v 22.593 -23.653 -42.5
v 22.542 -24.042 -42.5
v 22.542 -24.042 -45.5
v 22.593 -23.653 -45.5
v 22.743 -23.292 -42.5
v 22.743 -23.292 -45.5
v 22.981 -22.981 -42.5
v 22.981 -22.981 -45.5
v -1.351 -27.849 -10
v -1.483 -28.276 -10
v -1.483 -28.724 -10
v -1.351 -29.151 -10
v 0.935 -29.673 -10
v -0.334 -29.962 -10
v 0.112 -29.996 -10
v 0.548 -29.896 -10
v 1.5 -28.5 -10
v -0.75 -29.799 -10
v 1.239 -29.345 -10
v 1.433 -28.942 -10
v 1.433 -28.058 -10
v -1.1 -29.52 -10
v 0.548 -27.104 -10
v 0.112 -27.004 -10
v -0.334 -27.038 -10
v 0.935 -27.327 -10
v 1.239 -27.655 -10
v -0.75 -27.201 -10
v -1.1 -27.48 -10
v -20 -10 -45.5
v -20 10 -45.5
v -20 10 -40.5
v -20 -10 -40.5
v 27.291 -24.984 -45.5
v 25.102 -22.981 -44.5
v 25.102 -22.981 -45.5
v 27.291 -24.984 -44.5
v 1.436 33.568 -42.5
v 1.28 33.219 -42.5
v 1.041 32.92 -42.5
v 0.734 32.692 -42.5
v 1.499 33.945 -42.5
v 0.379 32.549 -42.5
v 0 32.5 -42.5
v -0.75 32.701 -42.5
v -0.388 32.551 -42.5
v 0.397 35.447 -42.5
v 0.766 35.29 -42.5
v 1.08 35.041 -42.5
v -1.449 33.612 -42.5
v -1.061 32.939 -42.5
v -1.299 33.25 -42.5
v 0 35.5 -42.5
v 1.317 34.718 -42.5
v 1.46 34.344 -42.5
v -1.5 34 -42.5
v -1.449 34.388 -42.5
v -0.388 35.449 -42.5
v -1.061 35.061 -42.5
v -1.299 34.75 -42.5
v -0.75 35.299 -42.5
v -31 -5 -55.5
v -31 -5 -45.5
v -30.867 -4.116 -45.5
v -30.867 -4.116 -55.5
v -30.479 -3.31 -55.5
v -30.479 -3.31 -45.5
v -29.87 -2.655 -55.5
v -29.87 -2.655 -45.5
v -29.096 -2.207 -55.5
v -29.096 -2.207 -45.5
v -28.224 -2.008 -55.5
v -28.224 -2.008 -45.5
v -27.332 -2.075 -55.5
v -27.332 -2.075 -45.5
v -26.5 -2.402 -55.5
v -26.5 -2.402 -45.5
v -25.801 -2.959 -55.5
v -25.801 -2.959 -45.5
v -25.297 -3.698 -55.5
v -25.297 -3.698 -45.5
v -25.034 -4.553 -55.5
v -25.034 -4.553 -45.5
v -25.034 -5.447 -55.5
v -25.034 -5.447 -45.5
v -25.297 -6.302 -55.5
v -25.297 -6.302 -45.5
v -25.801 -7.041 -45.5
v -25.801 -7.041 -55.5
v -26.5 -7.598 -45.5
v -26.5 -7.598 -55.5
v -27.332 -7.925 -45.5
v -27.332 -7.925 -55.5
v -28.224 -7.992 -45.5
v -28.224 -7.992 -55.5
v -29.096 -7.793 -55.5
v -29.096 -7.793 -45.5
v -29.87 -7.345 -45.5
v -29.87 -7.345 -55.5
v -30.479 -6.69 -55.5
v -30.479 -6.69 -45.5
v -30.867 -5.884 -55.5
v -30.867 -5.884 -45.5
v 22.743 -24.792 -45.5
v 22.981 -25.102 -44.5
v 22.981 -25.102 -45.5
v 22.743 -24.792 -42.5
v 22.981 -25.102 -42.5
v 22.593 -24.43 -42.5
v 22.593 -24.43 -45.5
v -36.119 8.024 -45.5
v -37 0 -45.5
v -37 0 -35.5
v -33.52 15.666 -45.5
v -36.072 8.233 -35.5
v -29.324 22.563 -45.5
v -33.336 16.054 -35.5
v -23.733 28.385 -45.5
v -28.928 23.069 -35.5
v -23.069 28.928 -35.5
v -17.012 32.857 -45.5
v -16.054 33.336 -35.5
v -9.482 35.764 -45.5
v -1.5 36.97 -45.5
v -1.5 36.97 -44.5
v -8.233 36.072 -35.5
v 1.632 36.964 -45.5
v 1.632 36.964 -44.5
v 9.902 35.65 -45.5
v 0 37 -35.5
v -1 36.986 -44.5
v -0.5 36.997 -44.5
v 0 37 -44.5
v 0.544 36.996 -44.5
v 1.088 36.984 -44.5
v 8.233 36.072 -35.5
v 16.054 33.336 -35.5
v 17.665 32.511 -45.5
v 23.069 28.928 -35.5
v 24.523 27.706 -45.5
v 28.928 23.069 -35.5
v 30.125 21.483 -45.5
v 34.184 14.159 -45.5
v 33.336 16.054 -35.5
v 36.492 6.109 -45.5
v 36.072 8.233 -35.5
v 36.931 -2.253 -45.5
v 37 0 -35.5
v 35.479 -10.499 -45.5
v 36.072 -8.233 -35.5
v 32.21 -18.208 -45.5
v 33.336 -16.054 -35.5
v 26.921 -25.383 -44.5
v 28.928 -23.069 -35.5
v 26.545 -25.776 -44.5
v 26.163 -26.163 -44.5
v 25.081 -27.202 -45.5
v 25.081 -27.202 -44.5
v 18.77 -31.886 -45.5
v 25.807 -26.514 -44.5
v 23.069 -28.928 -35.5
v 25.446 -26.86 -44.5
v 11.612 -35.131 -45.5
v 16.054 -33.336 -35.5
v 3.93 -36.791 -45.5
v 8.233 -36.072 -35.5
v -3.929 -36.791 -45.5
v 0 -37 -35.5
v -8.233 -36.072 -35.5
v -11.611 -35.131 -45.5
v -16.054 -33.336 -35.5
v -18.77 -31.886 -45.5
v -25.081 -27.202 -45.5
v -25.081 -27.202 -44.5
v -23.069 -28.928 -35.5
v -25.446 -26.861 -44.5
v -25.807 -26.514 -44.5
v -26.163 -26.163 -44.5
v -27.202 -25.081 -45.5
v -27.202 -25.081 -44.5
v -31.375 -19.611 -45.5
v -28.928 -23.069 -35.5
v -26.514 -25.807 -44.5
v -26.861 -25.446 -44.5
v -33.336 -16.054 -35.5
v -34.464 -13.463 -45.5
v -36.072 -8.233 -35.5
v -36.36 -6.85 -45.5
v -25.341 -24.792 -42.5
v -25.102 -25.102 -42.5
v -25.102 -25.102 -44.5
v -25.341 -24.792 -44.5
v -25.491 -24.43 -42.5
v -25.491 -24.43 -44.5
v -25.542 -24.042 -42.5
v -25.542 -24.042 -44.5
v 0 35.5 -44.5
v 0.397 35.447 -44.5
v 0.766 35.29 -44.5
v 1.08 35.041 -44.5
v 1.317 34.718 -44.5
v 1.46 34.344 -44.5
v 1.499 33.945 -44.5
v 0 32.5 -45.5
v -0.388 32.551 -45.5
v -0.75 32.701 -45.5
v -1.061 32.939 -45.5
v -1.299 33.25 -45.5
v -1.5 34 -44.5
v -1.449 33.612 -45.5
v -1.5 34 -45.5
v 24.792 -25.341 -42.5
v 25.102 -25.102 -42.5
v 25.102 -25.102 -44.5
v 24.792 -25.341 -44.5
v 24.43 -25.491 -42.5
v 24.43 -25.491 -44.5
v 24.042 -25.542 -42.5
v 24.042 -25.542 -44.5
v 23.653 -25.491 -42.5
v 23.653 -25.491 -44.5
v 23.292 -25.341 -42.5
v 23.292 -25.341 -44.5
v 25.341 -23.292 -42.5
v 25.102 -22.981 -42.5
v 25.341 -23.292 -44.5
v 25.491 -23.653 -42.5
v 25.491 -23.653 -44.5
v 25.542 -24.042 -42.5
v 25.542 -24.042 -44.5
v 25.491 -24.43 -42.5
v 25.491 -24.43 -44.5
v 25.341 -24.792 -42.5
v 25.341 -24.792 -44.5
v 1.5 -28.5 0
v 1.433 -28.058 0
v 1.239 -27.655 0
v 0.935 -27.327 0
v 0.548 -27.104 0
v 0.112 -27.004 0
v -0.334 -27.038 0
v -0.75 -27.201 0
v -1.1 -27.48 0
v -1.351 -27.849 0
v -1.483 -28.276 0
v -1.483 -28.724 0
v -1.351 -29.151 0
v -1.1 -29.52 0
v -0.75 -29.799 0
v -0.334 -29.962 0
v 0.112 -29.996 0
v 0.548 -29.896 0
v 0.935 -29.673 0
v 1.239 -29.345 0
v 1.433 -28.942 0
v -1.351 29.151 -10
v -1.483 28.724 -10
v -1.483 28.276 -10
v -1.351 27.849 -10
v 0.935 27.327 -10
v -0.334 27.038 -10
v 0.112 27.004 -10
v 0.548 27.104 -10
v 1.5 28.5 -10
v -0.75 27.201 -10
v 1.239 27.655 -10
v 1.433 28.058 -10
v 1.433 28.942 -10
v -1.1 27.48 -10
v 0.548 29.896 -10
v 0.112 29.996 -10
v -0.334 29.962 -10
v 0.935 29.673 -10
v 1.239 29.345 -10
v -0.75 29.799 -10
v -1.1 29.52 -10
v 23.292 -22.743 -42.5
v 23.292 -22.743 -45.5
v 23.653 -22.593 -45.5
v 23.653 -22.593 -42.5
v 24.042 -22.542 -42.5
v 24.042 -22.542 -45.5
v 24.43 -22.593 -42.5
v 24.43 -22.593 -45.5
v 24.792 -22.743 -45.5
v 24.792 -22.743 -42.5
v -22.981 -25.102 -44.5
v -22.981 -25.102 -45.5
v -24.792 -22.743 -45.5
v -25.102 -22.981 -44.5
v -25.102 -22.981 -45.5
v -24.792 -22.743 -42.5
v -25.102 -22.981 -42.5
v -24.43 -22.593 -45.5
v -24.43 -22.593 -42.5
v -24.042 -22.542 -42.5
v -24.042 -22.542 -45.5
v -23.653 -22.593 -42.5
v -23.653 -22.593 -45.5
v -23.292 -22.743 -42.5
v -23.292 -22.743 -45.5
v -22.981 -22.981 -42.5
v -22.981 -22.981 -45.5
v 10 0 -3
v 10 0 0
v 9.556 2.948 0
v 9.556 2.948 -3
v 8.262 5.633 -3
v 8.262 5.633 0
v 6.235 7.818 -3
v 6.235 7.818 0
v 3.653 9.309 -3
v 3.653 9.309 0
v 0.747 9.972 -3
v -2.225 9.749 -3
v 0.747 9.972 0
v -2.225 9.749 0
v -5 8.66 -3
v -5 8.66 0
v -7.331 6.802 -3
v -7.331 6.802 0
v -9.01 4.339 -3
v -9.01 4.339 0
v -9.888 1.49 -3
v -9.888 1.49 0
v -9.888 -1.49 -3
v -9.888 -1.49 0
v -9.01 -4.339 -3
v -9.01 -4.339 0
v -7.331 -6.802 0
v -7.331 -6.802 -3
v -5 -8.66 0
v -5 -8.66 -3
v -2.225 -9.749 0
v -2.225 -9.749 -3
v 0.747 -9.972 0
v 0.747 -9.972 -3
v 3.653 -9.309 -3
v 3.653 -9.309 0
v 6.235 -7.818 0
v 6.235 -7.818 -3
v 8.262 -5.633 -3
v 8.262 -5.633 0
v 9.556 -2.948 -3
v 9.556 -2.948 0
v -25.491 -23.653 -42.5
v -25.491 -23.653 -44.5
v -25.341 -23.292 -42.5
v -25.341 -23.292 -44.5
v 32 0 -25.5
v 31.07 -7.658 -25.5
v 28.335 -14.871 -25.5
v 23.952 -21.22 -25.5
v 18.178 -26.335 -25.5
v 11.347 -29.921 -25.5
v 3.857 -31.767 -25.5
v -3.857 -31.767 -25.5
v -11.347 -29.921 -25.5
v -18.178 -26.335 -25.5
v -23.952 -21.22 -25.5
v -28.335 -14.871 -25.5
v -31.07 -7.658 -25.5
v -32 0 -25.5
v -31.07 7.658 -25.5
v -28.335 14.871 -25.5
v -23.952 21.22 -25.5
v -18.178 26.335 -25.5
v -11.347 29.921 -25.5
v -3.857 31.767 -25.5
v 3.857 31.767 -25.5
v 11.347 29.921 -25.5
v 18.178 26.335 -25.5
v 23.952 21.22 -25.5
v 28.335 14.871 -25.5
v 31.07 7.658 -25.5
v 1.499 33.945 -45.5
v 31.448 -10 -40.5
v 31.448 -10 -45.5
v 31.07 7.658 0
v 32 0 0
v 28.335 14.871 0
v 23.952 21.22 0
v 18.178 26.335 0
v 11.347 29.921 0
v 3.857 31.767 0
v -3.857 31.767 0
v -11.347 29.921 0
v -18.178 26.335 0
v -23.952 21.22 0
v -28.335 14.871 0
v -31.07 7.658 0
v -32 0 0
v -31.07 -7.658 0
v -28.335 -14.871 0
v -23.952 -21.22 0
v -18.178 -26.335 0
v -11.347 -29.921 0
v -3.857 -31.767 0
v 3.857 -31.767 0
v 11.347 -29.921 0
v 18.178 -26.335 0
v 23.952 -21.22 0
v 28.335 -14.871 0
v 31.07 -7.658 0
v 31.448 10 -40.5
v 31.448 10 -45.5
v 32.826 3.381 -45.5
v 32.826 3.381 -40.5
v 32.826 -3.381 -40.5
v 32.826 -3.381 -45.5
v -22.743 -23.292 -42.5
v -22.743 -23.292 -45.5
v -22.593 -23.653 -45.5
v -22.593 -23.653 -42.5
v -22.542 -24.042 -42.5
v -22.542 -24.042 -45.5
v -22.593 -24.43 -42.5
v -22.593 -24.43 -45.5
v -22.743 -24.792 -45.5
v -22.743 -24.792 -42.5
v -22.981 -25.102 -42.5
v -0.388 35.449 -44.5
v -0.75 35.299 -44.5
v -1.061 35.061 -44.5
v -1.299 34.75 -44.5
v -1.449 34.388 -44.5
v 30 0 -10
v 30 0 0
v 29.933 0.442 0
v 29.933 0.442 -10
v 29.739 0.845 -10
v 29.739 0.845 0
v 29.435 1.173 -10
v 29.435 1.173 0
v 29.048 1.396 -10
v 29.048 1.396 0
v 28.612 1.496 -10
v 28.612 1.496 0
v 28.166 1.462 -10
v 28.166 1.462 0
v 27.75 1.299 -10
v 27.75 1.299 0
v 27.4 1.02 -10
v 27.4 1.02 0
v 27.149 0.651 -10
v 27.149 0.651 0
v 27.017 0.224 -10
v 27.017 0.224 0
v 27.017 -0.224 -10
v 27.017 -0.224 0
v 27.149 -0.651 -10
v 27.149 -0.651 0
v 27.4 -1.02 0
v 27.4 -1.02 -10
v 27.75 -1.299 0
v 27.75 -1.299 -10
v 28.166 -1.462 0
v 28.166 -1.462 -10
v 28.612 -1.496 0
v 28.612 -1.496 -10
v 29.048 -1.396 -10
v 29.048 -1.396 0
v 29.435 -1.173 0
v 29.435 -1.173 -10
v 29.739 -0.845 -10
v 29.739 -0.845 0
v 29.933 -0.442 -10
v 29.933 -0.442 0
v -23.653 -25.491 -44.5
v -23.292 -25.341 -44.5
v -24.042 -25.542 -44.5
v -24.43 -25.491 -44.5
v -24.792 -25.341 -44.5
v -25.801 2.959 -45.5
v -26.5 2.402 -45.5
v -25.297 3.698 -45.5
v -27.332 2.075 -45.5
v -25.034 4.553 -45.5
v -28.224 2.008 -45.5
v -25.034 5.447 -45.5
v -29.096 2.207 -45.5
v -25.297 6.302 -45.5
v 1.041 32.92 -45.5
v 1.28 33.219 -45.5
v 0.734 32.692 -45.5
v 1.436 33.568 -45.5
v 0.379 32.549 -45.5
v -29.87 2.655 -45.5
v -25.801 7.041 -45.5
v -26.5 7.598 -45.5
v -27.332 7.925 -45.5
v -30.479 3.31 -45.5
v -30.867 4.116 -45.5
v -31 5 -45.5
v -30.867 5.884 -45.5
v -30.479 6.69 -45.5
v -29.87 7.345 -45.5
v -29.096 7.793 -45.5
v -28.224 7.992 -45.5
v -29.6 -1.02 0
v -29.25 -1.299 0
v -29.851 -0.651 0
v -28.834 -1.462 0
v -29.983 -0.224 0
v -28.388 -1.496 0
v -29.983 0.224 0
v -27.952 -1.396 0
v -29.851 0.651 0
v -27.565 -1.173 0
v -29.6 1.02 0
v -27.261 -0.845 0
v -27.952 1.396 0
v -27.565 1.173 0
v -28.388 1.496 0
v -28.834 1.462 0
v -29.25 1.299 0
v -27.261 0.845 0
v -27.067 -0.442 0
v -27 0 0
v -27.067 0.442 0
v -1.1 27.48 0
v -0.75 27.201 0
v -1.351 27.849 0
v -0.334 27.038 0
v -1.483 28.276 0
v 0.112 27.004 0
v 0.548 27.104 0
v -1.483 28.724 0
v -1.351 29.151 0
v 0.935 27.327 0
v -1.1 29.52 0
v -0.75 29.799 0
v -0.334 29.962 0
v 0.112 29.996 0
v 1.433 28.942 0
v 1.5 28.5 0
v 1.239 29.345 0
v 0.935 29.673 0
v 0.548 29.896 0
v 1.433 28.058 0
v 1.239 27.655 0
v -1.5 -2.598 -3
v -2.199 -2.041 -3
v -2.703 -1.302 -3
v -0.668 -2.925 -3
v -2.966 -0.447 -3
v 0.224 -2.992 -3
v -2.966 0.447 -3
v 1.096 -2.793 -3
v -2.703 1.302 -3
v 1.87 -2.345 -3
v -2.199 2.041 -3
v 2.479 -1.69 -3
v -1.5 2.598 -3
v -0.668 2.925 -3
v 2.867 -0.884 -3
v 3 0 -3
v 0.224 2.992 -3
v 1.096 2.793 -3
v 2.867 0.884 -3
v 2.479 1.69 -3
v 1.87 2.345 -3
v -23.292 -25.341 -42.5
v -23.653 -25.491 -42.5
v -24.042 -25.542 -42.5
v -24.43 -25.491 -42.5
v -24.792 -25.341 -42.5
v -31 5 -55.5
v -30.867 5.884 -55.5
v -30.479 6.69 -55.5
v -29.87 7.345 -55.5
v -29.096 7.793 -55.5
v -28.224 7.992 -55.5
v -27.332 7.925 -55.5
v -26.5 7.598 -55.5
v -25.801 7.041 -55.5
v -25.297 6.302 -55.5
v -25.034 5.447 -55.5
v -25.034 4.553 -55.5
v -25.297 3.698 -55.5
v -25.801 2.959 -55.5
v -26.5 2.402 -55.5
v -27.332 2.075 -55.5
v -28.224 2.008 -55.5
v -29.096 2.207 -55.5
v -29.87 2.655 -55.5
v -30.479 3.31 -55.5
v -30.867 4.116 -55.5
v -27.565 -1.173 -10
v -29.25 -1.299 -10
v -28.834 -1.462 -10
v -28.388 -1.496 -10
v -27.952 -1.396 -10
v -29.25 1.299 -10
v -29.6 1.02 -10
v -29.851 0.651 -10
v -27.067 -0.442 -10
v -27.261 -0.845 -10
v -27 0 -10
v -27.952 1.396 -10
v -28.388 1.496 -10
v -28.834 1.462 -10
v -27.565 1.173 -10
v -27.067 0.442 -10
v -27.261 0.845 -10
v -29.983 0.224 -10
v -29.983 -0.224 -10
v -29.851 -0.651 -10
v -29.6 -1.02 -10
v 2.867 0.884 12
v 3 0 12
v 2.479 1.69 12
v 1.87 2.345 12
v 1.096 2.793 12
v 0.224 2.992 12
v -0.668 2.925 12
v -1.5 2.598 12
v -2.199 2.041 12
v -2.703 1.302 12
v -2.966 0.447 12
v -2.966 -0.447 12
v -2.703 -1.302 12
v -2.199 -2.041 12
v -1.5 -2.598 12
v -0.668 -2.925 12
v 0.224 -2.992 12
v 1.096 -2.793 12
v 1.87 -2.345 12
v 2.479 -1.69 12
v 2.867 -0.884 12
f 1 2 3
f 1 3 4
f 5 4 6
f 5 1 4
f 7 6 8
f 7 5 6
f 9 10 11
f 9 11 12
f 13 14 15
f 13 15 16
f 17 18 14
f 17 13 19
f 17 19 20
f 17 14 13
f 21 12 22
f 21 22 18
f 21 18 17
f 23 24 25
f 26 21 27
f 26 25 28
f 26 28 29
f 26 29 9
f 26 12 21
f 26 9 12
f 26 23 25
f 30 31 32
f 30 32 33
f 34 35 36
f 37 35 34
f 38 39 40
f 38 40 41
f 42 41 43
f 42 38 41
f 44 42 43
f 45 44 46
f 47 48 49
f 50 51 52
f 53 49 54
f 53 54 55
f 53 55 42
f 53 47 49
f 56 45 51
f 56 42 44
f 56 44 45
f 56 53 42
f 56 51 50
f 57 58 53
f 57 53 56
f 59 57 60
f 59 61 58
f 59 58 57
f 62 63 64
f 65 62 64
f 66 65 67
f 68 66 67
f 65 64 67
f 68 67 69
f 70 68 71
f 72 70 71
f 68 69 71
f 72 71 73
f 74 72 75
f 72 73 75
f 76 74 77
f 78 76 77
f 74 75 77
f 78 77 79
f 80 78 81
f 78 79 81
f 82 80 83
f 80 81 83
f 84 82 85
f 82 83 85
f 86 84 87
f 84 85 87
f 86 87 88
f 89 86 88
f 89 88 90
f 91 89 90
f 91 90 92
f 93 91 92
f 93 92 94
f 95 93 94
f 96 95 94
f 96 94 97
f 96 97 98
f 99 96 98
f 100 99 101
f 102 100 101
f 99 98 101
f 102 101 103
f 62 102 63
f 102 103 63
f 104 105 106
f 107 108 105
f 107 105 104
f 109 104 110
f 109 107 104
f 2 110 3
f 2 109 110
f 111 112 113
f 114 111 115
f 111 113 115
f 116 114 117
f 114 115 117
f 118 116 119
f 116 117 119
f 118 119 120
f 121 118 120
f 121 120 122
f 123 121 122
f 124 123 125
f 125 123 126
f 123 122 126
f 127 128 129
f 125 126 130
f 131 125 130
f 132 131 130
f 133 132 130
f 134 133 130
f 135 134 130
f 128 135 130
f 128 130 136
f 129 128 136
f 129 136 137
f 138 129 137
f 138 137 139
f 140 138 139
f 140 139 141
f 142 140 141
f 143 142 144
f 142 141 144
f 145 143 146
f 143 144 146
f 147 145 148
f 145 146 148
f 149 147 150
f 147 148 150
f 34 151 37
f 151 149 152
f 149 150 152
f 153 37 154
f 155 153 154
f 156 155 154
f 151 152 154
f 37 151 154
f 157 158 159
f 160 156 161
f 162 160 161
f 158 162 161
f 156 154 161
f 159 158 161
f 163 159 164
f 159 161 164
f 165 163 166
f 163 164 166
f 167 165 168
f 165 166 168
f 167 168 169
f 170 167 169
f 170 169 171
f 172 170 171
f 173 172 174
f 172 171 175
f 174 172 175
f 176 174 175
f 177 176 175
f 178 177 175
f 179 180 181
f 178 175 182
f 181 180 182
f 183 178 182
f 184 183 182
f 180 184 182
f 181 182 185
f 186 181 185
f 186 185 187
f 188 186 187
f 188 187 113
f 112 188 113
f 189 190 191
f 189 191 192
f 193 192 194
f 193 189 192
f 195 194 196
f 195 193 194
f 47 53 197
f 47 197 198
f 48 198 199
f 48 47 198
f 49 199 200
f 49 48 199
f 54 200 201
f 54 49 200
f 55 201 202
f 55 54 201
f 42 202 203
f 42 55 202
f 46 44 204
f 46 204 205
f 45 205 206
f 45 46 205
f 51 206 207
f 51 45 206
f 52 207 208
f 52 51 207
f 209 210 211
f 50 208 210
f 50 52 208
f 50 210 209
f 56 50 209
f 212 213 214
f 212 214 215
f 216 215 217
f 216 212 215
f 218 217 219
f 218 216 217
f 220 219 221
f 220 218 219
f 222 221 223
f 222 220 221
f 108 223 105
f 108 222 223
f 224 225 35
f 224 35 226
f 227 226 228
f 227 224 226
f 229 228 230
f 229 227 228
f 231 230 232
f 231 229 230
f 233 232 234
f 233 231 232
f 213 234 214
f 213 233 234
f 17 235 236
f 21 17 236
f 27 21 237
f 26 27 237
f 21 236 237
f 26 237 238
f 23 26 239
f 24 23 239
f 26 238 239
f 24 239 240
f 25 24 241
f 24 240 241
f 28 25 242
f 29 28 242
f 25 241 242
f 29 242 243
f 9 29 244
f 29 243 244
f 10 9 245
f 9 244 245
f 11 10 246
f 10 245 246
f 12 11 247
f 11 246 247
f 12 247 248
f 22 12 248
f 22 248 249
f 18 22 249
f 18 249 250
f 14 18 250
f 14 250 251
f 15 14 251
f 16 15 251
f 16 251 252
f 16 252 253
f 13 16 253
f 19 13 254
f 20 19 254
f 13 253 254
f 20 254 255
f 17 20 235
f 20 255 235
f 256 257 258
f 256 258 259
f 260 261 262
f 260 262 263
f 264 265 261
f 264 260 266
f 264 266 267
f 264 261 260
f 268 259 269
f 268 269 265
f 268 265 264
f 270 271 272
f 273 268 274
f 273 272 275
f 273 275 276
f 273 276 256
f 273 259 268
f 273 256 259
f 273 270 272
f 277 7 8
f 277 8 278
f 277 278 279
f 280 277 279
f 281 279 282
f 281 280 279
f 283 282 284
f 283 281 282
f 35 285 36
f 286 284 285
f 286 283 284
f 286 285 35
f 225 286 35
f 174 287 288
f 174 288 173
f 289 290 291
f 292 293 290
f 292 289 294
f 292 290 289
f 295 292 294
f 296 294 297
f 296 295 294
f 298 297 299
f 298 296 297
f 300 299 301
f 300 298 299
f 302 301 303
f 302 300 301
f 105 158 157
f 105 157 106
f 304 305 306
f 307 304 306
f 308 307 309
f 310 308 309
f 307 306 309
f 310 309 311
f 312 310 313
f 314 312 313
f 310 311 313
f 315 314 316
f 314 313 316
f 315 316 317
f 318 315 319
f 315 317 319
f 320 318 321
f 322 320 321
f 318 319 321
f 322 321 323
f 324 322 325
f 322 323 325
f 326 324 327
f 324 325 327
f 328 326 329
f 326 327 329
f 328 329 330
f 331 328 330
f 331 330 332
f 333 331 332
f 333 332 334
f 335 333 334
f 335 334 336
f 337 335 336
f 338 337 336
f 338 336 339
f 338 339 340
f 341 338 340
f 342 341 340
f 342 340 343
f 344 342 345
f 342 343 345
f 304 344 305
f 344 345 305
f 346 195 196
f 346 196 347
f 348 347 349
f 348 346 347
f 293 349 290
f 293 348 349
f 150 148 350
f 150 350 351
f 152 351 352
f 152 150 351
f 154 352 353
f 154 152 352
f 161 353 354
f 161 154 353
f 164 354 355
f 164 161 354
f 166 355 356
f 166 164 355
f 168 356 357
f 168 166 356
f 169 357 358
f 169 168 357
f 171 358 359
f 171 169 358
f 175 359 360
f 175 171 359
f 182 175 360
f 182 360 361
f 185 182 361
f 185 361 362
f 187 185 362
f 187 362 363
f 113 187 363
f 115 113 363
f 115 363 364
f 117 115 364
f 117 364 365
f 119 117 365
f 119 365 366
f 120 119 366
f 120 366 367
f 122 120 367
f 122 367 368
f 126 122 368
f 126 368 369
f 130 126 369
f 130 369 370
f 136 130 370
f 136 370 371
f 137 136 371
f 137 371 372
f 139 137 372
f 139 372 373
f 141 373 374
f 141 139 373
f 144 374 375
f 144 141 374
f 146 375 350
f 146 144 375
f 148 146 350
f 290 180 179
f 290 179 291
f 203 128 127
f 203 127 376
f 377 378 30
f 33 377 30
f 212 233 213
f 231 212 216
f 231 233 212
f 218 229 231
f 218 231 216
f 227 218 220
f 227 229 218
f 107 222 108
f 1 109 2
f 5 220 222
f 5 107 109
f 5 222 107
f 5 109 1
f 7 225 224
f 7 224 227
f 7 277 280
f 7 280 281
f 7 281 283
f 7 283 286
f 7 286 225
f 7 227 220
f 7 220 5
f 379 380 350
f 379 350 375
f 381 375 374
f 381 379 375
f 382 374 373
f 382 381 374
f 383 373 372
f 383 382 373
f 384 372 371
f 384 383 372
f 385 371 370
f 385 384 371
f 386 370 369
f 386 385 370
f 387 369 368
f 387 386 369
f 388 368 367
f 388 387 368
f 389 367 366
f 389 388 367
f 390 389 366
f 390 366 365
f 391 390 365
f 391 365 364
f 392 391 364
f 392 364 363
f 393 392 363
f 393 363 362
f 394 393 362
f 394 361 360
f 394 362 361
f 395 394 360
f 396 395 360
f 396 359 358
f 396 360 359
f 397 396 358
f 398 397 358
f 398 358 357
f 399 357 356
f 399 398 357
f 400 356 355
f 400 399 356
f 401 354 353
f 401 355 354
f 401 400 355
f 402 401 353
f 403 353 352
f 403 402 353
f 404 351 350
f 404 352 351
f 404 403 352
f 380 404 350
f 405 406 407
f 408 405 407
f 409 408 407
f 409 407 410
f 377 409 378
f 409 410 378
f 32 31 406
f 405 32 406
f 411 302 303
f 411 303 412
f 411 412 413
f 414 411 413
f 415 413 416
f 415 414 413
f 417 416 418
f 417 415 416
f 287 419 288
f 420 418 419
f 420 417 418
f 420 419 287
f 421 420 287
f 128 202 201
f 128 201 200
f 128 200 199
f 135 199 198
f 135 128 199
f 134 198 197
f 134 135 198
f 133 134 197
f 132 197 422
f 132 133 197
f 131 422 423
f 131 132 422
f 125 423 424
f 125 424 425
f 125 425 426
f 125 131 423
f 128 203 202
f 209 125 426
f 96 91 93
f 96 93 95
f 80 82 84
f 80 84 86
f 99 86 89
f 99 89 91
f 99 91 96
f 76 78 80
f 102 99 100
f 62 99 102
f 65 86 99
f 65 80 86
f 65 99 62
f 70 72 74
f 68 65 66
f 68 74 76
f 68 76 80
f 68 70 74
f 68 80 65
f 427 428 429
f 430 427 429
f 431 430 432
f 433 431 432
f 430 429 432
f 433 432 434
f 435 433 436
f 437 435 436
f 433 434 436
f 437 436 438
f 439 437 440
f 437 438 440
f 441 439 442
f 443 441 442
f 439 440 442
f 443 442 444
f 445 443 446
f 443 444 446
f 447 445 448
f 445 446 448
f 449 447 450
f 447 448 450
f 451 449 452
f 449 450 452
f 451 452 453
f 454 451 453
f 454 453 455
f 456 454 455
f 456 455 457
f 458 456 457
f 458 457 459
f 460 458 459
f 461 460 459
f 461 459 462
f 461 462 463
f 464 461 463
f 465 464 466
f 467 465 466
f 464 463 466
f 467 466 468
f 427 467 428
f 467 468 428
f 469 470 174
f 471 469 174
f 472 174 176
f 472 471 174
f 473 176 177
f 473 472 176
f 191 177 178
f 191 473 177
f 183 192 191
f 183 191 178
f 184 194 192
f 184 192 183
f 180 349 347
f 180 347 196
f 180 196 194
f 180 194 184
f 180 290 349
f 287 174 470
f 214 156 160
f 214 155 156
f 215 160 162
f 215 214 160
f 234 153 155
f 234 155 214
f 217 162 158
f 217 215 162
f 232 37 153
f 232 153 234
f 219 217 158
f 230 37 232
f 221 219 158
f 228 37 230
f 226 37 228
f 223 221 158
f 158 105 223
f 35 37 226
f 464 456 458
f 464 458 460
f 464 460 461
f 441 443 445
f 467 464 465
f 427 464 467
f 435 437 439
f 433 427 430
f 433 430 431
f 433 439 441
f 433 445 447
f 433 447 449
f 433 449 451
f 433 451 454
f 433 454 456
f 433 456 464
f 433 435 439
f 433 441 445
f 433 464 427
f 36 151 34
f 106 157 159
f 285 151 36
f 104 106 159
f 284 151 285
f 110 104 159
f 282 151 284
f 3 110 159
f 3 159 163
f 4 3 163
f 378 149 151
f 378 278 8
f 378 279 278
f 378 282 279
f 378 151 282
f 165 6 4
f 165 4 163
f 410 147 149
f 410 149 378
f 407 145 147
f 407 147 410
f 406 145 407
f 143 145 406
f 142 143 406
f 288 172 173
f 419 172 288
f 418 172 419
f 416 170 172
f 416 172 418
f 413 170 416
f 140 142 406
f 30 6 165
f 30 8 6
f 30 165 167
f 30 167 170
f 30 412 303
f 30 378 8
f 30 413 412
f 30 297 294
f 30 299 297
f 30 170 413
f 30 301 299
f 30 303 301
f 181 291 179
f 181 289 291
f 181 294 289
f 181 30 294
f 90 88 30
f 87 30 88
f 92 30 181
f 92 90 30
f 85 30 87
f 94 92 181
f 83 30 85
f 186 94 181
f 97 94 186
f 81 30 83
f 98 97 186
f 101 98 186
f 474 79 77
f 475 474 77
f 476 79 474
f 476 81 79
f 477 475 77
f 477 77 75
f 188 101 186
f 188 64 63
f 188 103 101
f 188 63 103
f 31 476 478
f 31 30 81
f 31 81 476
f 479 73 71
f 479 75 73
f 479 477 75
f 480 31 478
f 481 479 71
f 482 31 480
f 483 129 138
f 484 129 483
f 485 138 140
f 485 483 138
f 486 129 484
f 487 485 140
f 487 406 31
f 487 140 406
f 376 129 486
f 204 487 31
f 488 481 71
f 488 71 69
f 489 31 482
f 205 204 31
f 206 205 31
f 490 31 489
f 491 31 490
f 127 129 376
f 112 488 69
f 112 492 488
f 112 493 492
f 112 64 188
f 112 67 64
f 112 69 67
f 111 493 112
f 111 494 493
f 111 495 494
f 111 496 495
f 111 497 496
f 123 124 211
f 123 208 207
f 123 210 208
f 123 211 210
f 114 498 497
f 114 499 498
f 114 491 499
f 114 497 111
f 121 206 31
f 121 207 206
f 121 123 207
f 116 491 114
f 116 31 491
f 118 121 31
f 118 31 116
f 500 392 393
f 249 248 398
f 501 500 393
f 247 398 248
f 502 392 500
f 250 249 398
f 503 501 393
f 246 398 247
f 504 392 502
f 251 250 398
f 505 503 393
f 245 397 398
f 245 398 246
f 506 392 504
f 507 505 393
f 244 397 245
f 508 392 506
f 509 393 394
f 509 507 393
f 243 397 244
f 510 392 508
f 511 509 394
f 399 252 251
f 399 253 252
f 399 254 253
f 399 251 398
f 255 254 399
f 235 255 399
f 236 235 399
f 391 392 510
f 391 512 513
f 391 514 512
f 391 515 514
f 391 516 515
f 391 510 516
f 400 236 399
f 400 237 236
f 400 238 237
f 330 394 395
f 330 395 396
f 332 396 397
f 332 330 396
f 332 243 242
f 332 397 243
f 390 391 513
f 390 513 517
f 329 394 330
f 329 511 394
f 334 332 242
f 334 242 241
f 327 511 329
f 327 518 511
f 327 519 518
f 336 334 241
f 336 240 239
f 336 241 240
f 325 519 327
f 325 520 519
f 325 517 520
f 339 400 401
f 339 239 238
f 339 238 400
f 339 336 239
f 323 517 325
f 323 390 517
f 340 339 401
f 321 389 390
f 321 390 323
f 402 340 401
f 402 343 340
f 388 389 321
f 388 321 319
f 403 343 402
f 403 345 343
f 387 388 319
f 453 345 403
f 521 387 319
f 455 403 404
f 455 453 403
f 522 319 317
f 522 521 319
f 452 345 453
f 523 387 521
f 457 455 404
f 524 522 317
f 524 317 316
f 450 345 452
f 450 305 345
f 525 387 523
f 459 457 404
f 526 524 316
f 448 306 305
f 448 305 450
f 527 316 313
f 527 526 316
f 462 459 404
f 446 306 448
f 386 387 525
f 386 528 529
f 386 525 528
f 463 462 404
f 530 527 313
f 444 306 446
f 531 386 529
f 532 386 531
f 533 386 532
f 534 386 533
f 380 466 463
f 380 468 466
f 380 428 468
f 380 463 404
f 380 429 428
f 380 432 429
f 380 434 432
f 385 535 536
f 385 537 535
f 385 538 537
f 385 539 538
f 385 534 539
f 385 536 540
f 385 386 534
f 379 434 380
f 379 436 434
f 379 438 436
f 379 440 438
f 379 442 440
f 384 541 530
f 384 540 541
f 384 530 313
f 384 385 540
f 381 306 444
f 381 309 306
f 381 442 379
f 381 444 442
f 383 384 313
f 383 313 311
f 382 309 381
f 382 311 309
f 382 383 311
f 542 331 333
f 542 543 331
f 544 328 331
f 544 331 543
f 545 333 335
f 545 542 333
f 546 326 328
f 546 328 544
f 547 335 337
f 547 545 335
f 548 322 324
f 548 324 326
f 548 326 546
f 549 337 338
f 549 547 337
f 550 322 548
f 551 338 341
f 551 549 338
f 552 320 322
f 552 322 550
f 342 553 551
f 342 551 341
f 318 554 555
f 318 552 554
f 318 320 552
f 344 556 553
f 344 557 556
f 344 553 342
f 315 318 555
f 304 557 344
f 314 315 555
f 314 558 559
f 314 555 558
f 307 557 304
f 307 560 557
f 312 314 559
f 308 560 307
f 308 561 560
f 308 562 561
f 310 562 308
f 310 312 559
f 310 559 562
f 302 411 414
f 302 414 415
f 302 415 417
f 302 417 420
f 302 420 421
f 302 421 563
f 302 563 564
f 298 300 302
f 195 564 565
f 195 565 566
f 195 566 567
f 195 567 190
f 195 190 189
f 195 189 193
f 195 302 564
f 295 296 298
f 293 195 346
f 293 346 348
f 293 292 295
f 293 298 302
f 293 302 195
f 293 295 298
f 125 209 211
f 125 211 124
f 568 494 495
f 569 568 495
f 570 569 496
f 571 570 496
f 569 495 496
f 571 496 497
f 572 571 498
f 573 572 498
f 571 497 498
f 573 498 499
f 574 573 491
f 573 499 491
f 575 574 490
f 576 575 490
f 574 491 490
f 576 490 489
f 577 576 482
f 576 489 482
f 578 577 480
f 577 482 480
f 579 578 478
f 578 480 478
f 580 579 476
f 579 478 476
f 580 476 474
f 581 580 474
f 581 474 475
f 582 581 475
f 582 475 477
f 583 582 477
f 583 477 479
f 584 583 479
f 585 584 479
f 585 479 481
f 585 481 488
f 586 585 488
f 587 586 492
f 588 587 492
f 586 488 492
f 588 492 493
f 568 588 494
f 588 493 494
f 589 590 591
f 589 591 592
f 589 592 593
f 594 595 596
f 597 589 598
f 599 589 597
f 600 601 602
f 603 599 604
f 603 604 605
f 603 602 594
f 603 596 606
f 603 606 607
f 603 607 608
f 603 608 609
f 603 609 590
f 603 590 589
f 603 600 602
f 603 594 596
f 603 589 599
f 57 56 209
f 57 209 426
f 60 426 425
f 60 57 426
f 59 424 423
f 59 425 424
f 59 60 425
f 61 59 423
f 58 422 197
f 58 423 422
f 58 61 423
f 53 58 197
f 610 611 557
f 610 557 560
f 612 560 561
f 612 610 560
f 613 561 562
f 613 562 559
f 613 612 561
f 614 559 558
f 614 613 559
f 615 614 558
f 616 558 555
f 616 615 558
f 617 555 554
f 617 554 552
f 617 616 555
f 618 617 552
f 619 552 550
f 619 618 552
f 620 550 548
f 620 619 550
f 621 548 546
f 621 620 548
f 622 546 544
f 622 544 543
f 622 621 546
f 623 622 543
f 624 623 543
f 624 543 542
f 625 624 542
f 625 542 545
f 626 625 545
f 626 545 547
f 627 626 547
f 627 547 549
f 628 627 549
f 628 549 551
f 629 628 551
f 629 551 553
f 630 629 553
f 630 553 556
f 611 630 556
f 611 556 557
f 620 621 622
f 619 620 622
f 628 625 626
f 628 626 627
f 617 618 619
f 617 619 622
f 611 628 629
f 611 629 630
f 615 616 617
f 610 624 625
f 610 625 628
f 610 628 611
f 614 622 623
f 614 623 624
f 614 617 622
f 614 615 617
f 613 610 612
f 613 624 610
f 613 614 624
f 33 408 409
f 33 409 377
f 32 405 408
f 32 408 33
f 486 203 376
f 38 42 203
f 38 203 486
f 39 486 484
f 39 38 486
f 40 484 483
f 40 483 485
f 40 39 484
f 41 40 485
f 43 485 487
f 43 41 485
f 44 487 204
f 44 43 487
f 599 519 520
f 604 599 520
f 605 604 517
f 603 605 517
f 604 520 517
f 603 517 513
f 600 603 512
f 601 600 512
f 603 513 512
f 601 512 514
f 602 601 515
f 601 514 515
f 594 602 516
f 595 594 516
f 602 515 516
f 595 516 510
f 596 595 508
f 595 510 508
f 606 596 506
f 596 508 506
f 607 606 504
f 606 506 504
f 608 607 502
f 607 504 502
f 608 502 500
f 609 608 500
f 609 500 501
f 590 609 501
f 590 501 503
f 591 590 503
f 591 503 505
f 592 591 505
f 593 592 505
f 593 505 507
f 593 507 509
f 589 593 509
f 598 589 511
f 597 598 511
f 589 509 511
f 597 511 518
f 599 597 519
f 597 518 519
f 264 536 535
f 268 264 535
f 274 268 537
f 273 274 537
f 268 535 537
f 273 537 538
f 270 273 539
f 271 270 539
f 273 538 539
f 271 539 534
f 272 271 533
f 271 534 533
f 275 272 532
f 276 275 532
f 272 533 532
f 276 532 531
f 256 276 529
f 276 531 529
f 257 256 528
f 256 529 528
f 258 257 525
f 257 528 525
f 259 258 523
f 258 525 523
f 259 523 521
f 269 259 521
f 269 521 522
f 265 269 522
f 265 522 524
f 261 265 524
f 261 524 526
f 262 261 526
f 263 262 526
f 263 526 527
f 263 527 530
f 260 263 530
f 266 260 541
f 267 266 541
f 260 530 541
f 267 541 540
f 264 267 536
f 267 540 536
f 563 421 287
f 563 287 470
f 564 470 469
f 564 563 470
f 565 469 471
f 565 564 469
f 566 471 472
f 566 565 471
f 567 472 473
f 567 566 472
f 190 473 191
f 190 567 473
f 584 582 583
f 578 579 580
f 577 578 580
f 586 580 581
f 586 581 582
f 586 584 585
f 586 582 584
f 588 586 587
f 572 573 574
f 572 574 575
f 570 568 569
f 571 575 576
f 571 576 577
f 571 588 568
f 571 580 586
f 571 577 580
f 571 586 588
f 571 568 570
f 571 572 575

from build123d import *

# Parameters (mm, degrees)
SKETCH_1_R          = 32
EXTRUDE_1_DEPTH     = 25.5
SKETCH_3_R          = 37
EXTRUDE_3_DEPTH     = 10
SKETCH_4_R          = 1.5
CUT_EXTRUDE_1_DEPTH = 10
CUT_EXTRUDE_2_DEPTH = 5
SKETCH_7_R          = 3
EXTRUDE_4_DEPTH     = 10
CUT_EXTRUDE_START   = -1
CUT_EXTRUDE_3_DEPTH = 1
CUT_EXTRUDE_START_2 = -3
SKETCH_8_3_R        = 1.5
CUT_EXTRUDE_4_DEPTH = 3
SKETCH_9_R          = 10
SKETCH_9_R_2        = 3
CUT_EXTRUDE_5_DEPTH = 3
EXTRUDE_START       = 12
SKETCH_9_4_R        = 3
EXTRUDE_5_DEPTH     = 12


with BuildPart() as part:
    # 草图1 → 凸台-拉伸1 (new body)
    with BuildSketch(Plane.XY):
        Circle(SKETCH_1_R)
    extrude(amount=-EXTRUDE_1_DEPTH)



with BuildPart() as body_2:
    # 草图3 → 凸台-拉伸3 (new body)
    with BuildSketch(Plane(origin=(0, 0, -35.5), x_dir=(-1, 0, 0), z_dir=(0, 0, -1))):
        Circle(SKETCH_3_R)
    extrude(amount=EXTRUDE_3_DEPTH)


with BuildPart() as part_1:
    add(part.part)

    add(body_2.part)  # loft_1 joins it to this body
    # loft up to a face of the part (loft_1)
    loft([Face(Wire([part_1.edges().sort_by_distance((-21.90550739, -23.326996077, -25.5))[0]])), Face(Wire([part_1.edges().sort_by_distance((25.328242919, -26.971839215, -35.5))[0]]))])

    # 草图4 → 切除-拉伸1 (cut)
    with BuildSketch(Plane.XY):
        with Locations((28.5, 0)):
            Circle(SKETCH_4_R)
        with Locations((-28.5, 0)):
            Circle(SKETCH_4_R)
        with Locations((0, 28.5)):
            Circle(SKETCH_4_R)
        with Locations((0, -28.5)):
            Circle(SKETCH_4_R)
    extrude(amount=-CUT_EXTRUDE_1_DEPTH, mode=Mode.SUBTRACT)

    # 草图5 → 切除-拉伸2 (cut)
    with BuildSketch(Plane(origin=(0, 0, -45.5), x_dir=(-1, 0, 0), z_dir=(0, 0, -1))):
        with BuildLine():
            Line((-31.448370387, -10), (20, -10))
            Line((20, -10), (20, 10))
            Line((20, 10), (-31.448370387, 10))
            ThreePointArc((-31.448370387, 10), (-33, 0), (-31.448370387, -10))
        make_face()
    extrude(amount=-CUT_EXTRUDE_2_DEPTH, mode=Mode.SUBTRACT)

    # 草图7 → 凸台-拉伸4 (add)
    with BuildSketch(Plane(origin=(0, 0, -45.5), x_dir=(-1, 0, 0), z_dir=(0, 0, -1))):
        with Locations((28, 5)):
            Circle(SKETCH_7_R)
        with Locations((28, -5)):
            Circle(SKETCH_7_R)
    extrude(amount=EXTRUDE_4_DEPTH)

    # 草图8 → 切除-拉伸3 (cut)
    with BuildSketch(Plane(origin=(0, 0, -45.5), x_dir=(-1, 0, 0), z_dir=(0, 0, -1)).offset(CUT_EXTRUDE_START)):
        with BuildLine():
            Line((-1.632304903, 36.963976798), (-1.499003176, 33.945323885))
            ThreePointArc((-1.499003176, 33.945323885), (-0.0273426, 35.499750773), (1.5, 34))
            Line((1.5, 34), (1.5, 36.969582091))
            ThreePointArc((1.5, 36.969582091), (-0.066211794, 36.999940757), (-1.632304903, 36.963976798))
        make_face()
        with BuildLine():
            Line((-25.08100879, -27.201893281), (-22.980970389, -25.102290732))
            ThreePointArc((-22.980970389, -25.102290732), (-25.102290732, -25.102290732), (-25.102290732, -22.980970389))
            Line((-25.102290732, -22.980970389), (-27.290652839, -24.984400486))
            ThreePointArc((-27.290652839, -24.984400486), (-26.209293276, -26.1165263), (-25.08100879, -27.201893281))
        make_face()
        with BuildLine():
            Line((22.980970389, -25.102290732), (25.080782023, -27.202102366))
            ThreePointArc((25.080782023, -27.202102366), (26.162950904, -26.162950904), (27.202102366, -25.080782023))
            Line((27.202102366, -25.080782023), (25.102290732, -22.980970389))
            ThreePointArc((25.102290732, -22.980970389), (25.102290732, -25.102290732), (22.980970389, -25.102290732))
        make_face()
    extrude(amount=CUT_EXTRUDE_3_DEPTH, mode=Mode.SUBTRACT)

    # 草图8<3> → 切除-拉伸4 (cut)
    with BuildSketch(Plane(origin=(0, 0, -45.5), x_dir=(-1, 0, 0), z_dir=(0, 0, -1)).offset(CUT_EXTRUDE_START_2)):
        with Locations((0, 34)):
            Circle(SKETCH_8_3_R)
        with Locations((24.04163056, -24.04163056)):
            Circle(SKETCH_8_3_R)
        with Locations((-24.04163056, -24.04163056)):
            Circle(SKETCH_8_3_R)
    extrude(amount=CUT_EXTRUDE_4_DEPTH, mode=Mode.SUBTRACT)

    # 草图9 → 切除-拉伸5 (cut)
    with BuildSketch(Plane.XY):
        Circle(SKETCH_9_R)
        Circle(SKETCH_9_R_2, mode=Mode.SUBTRACT)
    extrude(amount=-CUT_EXTRUDE_5_DEPTH, mode=Mode.SUBTRACT)

    # 草图9<4> → 凸台-拉伸5 (add)
    with BuildSketch(Plane.XY.offset(EXTRUDE_START)):
        Circle(SKETCH_9_4_R)
    extrude(amount=-EXTRUDE_5_DEPTH)


solid = part_1.part
